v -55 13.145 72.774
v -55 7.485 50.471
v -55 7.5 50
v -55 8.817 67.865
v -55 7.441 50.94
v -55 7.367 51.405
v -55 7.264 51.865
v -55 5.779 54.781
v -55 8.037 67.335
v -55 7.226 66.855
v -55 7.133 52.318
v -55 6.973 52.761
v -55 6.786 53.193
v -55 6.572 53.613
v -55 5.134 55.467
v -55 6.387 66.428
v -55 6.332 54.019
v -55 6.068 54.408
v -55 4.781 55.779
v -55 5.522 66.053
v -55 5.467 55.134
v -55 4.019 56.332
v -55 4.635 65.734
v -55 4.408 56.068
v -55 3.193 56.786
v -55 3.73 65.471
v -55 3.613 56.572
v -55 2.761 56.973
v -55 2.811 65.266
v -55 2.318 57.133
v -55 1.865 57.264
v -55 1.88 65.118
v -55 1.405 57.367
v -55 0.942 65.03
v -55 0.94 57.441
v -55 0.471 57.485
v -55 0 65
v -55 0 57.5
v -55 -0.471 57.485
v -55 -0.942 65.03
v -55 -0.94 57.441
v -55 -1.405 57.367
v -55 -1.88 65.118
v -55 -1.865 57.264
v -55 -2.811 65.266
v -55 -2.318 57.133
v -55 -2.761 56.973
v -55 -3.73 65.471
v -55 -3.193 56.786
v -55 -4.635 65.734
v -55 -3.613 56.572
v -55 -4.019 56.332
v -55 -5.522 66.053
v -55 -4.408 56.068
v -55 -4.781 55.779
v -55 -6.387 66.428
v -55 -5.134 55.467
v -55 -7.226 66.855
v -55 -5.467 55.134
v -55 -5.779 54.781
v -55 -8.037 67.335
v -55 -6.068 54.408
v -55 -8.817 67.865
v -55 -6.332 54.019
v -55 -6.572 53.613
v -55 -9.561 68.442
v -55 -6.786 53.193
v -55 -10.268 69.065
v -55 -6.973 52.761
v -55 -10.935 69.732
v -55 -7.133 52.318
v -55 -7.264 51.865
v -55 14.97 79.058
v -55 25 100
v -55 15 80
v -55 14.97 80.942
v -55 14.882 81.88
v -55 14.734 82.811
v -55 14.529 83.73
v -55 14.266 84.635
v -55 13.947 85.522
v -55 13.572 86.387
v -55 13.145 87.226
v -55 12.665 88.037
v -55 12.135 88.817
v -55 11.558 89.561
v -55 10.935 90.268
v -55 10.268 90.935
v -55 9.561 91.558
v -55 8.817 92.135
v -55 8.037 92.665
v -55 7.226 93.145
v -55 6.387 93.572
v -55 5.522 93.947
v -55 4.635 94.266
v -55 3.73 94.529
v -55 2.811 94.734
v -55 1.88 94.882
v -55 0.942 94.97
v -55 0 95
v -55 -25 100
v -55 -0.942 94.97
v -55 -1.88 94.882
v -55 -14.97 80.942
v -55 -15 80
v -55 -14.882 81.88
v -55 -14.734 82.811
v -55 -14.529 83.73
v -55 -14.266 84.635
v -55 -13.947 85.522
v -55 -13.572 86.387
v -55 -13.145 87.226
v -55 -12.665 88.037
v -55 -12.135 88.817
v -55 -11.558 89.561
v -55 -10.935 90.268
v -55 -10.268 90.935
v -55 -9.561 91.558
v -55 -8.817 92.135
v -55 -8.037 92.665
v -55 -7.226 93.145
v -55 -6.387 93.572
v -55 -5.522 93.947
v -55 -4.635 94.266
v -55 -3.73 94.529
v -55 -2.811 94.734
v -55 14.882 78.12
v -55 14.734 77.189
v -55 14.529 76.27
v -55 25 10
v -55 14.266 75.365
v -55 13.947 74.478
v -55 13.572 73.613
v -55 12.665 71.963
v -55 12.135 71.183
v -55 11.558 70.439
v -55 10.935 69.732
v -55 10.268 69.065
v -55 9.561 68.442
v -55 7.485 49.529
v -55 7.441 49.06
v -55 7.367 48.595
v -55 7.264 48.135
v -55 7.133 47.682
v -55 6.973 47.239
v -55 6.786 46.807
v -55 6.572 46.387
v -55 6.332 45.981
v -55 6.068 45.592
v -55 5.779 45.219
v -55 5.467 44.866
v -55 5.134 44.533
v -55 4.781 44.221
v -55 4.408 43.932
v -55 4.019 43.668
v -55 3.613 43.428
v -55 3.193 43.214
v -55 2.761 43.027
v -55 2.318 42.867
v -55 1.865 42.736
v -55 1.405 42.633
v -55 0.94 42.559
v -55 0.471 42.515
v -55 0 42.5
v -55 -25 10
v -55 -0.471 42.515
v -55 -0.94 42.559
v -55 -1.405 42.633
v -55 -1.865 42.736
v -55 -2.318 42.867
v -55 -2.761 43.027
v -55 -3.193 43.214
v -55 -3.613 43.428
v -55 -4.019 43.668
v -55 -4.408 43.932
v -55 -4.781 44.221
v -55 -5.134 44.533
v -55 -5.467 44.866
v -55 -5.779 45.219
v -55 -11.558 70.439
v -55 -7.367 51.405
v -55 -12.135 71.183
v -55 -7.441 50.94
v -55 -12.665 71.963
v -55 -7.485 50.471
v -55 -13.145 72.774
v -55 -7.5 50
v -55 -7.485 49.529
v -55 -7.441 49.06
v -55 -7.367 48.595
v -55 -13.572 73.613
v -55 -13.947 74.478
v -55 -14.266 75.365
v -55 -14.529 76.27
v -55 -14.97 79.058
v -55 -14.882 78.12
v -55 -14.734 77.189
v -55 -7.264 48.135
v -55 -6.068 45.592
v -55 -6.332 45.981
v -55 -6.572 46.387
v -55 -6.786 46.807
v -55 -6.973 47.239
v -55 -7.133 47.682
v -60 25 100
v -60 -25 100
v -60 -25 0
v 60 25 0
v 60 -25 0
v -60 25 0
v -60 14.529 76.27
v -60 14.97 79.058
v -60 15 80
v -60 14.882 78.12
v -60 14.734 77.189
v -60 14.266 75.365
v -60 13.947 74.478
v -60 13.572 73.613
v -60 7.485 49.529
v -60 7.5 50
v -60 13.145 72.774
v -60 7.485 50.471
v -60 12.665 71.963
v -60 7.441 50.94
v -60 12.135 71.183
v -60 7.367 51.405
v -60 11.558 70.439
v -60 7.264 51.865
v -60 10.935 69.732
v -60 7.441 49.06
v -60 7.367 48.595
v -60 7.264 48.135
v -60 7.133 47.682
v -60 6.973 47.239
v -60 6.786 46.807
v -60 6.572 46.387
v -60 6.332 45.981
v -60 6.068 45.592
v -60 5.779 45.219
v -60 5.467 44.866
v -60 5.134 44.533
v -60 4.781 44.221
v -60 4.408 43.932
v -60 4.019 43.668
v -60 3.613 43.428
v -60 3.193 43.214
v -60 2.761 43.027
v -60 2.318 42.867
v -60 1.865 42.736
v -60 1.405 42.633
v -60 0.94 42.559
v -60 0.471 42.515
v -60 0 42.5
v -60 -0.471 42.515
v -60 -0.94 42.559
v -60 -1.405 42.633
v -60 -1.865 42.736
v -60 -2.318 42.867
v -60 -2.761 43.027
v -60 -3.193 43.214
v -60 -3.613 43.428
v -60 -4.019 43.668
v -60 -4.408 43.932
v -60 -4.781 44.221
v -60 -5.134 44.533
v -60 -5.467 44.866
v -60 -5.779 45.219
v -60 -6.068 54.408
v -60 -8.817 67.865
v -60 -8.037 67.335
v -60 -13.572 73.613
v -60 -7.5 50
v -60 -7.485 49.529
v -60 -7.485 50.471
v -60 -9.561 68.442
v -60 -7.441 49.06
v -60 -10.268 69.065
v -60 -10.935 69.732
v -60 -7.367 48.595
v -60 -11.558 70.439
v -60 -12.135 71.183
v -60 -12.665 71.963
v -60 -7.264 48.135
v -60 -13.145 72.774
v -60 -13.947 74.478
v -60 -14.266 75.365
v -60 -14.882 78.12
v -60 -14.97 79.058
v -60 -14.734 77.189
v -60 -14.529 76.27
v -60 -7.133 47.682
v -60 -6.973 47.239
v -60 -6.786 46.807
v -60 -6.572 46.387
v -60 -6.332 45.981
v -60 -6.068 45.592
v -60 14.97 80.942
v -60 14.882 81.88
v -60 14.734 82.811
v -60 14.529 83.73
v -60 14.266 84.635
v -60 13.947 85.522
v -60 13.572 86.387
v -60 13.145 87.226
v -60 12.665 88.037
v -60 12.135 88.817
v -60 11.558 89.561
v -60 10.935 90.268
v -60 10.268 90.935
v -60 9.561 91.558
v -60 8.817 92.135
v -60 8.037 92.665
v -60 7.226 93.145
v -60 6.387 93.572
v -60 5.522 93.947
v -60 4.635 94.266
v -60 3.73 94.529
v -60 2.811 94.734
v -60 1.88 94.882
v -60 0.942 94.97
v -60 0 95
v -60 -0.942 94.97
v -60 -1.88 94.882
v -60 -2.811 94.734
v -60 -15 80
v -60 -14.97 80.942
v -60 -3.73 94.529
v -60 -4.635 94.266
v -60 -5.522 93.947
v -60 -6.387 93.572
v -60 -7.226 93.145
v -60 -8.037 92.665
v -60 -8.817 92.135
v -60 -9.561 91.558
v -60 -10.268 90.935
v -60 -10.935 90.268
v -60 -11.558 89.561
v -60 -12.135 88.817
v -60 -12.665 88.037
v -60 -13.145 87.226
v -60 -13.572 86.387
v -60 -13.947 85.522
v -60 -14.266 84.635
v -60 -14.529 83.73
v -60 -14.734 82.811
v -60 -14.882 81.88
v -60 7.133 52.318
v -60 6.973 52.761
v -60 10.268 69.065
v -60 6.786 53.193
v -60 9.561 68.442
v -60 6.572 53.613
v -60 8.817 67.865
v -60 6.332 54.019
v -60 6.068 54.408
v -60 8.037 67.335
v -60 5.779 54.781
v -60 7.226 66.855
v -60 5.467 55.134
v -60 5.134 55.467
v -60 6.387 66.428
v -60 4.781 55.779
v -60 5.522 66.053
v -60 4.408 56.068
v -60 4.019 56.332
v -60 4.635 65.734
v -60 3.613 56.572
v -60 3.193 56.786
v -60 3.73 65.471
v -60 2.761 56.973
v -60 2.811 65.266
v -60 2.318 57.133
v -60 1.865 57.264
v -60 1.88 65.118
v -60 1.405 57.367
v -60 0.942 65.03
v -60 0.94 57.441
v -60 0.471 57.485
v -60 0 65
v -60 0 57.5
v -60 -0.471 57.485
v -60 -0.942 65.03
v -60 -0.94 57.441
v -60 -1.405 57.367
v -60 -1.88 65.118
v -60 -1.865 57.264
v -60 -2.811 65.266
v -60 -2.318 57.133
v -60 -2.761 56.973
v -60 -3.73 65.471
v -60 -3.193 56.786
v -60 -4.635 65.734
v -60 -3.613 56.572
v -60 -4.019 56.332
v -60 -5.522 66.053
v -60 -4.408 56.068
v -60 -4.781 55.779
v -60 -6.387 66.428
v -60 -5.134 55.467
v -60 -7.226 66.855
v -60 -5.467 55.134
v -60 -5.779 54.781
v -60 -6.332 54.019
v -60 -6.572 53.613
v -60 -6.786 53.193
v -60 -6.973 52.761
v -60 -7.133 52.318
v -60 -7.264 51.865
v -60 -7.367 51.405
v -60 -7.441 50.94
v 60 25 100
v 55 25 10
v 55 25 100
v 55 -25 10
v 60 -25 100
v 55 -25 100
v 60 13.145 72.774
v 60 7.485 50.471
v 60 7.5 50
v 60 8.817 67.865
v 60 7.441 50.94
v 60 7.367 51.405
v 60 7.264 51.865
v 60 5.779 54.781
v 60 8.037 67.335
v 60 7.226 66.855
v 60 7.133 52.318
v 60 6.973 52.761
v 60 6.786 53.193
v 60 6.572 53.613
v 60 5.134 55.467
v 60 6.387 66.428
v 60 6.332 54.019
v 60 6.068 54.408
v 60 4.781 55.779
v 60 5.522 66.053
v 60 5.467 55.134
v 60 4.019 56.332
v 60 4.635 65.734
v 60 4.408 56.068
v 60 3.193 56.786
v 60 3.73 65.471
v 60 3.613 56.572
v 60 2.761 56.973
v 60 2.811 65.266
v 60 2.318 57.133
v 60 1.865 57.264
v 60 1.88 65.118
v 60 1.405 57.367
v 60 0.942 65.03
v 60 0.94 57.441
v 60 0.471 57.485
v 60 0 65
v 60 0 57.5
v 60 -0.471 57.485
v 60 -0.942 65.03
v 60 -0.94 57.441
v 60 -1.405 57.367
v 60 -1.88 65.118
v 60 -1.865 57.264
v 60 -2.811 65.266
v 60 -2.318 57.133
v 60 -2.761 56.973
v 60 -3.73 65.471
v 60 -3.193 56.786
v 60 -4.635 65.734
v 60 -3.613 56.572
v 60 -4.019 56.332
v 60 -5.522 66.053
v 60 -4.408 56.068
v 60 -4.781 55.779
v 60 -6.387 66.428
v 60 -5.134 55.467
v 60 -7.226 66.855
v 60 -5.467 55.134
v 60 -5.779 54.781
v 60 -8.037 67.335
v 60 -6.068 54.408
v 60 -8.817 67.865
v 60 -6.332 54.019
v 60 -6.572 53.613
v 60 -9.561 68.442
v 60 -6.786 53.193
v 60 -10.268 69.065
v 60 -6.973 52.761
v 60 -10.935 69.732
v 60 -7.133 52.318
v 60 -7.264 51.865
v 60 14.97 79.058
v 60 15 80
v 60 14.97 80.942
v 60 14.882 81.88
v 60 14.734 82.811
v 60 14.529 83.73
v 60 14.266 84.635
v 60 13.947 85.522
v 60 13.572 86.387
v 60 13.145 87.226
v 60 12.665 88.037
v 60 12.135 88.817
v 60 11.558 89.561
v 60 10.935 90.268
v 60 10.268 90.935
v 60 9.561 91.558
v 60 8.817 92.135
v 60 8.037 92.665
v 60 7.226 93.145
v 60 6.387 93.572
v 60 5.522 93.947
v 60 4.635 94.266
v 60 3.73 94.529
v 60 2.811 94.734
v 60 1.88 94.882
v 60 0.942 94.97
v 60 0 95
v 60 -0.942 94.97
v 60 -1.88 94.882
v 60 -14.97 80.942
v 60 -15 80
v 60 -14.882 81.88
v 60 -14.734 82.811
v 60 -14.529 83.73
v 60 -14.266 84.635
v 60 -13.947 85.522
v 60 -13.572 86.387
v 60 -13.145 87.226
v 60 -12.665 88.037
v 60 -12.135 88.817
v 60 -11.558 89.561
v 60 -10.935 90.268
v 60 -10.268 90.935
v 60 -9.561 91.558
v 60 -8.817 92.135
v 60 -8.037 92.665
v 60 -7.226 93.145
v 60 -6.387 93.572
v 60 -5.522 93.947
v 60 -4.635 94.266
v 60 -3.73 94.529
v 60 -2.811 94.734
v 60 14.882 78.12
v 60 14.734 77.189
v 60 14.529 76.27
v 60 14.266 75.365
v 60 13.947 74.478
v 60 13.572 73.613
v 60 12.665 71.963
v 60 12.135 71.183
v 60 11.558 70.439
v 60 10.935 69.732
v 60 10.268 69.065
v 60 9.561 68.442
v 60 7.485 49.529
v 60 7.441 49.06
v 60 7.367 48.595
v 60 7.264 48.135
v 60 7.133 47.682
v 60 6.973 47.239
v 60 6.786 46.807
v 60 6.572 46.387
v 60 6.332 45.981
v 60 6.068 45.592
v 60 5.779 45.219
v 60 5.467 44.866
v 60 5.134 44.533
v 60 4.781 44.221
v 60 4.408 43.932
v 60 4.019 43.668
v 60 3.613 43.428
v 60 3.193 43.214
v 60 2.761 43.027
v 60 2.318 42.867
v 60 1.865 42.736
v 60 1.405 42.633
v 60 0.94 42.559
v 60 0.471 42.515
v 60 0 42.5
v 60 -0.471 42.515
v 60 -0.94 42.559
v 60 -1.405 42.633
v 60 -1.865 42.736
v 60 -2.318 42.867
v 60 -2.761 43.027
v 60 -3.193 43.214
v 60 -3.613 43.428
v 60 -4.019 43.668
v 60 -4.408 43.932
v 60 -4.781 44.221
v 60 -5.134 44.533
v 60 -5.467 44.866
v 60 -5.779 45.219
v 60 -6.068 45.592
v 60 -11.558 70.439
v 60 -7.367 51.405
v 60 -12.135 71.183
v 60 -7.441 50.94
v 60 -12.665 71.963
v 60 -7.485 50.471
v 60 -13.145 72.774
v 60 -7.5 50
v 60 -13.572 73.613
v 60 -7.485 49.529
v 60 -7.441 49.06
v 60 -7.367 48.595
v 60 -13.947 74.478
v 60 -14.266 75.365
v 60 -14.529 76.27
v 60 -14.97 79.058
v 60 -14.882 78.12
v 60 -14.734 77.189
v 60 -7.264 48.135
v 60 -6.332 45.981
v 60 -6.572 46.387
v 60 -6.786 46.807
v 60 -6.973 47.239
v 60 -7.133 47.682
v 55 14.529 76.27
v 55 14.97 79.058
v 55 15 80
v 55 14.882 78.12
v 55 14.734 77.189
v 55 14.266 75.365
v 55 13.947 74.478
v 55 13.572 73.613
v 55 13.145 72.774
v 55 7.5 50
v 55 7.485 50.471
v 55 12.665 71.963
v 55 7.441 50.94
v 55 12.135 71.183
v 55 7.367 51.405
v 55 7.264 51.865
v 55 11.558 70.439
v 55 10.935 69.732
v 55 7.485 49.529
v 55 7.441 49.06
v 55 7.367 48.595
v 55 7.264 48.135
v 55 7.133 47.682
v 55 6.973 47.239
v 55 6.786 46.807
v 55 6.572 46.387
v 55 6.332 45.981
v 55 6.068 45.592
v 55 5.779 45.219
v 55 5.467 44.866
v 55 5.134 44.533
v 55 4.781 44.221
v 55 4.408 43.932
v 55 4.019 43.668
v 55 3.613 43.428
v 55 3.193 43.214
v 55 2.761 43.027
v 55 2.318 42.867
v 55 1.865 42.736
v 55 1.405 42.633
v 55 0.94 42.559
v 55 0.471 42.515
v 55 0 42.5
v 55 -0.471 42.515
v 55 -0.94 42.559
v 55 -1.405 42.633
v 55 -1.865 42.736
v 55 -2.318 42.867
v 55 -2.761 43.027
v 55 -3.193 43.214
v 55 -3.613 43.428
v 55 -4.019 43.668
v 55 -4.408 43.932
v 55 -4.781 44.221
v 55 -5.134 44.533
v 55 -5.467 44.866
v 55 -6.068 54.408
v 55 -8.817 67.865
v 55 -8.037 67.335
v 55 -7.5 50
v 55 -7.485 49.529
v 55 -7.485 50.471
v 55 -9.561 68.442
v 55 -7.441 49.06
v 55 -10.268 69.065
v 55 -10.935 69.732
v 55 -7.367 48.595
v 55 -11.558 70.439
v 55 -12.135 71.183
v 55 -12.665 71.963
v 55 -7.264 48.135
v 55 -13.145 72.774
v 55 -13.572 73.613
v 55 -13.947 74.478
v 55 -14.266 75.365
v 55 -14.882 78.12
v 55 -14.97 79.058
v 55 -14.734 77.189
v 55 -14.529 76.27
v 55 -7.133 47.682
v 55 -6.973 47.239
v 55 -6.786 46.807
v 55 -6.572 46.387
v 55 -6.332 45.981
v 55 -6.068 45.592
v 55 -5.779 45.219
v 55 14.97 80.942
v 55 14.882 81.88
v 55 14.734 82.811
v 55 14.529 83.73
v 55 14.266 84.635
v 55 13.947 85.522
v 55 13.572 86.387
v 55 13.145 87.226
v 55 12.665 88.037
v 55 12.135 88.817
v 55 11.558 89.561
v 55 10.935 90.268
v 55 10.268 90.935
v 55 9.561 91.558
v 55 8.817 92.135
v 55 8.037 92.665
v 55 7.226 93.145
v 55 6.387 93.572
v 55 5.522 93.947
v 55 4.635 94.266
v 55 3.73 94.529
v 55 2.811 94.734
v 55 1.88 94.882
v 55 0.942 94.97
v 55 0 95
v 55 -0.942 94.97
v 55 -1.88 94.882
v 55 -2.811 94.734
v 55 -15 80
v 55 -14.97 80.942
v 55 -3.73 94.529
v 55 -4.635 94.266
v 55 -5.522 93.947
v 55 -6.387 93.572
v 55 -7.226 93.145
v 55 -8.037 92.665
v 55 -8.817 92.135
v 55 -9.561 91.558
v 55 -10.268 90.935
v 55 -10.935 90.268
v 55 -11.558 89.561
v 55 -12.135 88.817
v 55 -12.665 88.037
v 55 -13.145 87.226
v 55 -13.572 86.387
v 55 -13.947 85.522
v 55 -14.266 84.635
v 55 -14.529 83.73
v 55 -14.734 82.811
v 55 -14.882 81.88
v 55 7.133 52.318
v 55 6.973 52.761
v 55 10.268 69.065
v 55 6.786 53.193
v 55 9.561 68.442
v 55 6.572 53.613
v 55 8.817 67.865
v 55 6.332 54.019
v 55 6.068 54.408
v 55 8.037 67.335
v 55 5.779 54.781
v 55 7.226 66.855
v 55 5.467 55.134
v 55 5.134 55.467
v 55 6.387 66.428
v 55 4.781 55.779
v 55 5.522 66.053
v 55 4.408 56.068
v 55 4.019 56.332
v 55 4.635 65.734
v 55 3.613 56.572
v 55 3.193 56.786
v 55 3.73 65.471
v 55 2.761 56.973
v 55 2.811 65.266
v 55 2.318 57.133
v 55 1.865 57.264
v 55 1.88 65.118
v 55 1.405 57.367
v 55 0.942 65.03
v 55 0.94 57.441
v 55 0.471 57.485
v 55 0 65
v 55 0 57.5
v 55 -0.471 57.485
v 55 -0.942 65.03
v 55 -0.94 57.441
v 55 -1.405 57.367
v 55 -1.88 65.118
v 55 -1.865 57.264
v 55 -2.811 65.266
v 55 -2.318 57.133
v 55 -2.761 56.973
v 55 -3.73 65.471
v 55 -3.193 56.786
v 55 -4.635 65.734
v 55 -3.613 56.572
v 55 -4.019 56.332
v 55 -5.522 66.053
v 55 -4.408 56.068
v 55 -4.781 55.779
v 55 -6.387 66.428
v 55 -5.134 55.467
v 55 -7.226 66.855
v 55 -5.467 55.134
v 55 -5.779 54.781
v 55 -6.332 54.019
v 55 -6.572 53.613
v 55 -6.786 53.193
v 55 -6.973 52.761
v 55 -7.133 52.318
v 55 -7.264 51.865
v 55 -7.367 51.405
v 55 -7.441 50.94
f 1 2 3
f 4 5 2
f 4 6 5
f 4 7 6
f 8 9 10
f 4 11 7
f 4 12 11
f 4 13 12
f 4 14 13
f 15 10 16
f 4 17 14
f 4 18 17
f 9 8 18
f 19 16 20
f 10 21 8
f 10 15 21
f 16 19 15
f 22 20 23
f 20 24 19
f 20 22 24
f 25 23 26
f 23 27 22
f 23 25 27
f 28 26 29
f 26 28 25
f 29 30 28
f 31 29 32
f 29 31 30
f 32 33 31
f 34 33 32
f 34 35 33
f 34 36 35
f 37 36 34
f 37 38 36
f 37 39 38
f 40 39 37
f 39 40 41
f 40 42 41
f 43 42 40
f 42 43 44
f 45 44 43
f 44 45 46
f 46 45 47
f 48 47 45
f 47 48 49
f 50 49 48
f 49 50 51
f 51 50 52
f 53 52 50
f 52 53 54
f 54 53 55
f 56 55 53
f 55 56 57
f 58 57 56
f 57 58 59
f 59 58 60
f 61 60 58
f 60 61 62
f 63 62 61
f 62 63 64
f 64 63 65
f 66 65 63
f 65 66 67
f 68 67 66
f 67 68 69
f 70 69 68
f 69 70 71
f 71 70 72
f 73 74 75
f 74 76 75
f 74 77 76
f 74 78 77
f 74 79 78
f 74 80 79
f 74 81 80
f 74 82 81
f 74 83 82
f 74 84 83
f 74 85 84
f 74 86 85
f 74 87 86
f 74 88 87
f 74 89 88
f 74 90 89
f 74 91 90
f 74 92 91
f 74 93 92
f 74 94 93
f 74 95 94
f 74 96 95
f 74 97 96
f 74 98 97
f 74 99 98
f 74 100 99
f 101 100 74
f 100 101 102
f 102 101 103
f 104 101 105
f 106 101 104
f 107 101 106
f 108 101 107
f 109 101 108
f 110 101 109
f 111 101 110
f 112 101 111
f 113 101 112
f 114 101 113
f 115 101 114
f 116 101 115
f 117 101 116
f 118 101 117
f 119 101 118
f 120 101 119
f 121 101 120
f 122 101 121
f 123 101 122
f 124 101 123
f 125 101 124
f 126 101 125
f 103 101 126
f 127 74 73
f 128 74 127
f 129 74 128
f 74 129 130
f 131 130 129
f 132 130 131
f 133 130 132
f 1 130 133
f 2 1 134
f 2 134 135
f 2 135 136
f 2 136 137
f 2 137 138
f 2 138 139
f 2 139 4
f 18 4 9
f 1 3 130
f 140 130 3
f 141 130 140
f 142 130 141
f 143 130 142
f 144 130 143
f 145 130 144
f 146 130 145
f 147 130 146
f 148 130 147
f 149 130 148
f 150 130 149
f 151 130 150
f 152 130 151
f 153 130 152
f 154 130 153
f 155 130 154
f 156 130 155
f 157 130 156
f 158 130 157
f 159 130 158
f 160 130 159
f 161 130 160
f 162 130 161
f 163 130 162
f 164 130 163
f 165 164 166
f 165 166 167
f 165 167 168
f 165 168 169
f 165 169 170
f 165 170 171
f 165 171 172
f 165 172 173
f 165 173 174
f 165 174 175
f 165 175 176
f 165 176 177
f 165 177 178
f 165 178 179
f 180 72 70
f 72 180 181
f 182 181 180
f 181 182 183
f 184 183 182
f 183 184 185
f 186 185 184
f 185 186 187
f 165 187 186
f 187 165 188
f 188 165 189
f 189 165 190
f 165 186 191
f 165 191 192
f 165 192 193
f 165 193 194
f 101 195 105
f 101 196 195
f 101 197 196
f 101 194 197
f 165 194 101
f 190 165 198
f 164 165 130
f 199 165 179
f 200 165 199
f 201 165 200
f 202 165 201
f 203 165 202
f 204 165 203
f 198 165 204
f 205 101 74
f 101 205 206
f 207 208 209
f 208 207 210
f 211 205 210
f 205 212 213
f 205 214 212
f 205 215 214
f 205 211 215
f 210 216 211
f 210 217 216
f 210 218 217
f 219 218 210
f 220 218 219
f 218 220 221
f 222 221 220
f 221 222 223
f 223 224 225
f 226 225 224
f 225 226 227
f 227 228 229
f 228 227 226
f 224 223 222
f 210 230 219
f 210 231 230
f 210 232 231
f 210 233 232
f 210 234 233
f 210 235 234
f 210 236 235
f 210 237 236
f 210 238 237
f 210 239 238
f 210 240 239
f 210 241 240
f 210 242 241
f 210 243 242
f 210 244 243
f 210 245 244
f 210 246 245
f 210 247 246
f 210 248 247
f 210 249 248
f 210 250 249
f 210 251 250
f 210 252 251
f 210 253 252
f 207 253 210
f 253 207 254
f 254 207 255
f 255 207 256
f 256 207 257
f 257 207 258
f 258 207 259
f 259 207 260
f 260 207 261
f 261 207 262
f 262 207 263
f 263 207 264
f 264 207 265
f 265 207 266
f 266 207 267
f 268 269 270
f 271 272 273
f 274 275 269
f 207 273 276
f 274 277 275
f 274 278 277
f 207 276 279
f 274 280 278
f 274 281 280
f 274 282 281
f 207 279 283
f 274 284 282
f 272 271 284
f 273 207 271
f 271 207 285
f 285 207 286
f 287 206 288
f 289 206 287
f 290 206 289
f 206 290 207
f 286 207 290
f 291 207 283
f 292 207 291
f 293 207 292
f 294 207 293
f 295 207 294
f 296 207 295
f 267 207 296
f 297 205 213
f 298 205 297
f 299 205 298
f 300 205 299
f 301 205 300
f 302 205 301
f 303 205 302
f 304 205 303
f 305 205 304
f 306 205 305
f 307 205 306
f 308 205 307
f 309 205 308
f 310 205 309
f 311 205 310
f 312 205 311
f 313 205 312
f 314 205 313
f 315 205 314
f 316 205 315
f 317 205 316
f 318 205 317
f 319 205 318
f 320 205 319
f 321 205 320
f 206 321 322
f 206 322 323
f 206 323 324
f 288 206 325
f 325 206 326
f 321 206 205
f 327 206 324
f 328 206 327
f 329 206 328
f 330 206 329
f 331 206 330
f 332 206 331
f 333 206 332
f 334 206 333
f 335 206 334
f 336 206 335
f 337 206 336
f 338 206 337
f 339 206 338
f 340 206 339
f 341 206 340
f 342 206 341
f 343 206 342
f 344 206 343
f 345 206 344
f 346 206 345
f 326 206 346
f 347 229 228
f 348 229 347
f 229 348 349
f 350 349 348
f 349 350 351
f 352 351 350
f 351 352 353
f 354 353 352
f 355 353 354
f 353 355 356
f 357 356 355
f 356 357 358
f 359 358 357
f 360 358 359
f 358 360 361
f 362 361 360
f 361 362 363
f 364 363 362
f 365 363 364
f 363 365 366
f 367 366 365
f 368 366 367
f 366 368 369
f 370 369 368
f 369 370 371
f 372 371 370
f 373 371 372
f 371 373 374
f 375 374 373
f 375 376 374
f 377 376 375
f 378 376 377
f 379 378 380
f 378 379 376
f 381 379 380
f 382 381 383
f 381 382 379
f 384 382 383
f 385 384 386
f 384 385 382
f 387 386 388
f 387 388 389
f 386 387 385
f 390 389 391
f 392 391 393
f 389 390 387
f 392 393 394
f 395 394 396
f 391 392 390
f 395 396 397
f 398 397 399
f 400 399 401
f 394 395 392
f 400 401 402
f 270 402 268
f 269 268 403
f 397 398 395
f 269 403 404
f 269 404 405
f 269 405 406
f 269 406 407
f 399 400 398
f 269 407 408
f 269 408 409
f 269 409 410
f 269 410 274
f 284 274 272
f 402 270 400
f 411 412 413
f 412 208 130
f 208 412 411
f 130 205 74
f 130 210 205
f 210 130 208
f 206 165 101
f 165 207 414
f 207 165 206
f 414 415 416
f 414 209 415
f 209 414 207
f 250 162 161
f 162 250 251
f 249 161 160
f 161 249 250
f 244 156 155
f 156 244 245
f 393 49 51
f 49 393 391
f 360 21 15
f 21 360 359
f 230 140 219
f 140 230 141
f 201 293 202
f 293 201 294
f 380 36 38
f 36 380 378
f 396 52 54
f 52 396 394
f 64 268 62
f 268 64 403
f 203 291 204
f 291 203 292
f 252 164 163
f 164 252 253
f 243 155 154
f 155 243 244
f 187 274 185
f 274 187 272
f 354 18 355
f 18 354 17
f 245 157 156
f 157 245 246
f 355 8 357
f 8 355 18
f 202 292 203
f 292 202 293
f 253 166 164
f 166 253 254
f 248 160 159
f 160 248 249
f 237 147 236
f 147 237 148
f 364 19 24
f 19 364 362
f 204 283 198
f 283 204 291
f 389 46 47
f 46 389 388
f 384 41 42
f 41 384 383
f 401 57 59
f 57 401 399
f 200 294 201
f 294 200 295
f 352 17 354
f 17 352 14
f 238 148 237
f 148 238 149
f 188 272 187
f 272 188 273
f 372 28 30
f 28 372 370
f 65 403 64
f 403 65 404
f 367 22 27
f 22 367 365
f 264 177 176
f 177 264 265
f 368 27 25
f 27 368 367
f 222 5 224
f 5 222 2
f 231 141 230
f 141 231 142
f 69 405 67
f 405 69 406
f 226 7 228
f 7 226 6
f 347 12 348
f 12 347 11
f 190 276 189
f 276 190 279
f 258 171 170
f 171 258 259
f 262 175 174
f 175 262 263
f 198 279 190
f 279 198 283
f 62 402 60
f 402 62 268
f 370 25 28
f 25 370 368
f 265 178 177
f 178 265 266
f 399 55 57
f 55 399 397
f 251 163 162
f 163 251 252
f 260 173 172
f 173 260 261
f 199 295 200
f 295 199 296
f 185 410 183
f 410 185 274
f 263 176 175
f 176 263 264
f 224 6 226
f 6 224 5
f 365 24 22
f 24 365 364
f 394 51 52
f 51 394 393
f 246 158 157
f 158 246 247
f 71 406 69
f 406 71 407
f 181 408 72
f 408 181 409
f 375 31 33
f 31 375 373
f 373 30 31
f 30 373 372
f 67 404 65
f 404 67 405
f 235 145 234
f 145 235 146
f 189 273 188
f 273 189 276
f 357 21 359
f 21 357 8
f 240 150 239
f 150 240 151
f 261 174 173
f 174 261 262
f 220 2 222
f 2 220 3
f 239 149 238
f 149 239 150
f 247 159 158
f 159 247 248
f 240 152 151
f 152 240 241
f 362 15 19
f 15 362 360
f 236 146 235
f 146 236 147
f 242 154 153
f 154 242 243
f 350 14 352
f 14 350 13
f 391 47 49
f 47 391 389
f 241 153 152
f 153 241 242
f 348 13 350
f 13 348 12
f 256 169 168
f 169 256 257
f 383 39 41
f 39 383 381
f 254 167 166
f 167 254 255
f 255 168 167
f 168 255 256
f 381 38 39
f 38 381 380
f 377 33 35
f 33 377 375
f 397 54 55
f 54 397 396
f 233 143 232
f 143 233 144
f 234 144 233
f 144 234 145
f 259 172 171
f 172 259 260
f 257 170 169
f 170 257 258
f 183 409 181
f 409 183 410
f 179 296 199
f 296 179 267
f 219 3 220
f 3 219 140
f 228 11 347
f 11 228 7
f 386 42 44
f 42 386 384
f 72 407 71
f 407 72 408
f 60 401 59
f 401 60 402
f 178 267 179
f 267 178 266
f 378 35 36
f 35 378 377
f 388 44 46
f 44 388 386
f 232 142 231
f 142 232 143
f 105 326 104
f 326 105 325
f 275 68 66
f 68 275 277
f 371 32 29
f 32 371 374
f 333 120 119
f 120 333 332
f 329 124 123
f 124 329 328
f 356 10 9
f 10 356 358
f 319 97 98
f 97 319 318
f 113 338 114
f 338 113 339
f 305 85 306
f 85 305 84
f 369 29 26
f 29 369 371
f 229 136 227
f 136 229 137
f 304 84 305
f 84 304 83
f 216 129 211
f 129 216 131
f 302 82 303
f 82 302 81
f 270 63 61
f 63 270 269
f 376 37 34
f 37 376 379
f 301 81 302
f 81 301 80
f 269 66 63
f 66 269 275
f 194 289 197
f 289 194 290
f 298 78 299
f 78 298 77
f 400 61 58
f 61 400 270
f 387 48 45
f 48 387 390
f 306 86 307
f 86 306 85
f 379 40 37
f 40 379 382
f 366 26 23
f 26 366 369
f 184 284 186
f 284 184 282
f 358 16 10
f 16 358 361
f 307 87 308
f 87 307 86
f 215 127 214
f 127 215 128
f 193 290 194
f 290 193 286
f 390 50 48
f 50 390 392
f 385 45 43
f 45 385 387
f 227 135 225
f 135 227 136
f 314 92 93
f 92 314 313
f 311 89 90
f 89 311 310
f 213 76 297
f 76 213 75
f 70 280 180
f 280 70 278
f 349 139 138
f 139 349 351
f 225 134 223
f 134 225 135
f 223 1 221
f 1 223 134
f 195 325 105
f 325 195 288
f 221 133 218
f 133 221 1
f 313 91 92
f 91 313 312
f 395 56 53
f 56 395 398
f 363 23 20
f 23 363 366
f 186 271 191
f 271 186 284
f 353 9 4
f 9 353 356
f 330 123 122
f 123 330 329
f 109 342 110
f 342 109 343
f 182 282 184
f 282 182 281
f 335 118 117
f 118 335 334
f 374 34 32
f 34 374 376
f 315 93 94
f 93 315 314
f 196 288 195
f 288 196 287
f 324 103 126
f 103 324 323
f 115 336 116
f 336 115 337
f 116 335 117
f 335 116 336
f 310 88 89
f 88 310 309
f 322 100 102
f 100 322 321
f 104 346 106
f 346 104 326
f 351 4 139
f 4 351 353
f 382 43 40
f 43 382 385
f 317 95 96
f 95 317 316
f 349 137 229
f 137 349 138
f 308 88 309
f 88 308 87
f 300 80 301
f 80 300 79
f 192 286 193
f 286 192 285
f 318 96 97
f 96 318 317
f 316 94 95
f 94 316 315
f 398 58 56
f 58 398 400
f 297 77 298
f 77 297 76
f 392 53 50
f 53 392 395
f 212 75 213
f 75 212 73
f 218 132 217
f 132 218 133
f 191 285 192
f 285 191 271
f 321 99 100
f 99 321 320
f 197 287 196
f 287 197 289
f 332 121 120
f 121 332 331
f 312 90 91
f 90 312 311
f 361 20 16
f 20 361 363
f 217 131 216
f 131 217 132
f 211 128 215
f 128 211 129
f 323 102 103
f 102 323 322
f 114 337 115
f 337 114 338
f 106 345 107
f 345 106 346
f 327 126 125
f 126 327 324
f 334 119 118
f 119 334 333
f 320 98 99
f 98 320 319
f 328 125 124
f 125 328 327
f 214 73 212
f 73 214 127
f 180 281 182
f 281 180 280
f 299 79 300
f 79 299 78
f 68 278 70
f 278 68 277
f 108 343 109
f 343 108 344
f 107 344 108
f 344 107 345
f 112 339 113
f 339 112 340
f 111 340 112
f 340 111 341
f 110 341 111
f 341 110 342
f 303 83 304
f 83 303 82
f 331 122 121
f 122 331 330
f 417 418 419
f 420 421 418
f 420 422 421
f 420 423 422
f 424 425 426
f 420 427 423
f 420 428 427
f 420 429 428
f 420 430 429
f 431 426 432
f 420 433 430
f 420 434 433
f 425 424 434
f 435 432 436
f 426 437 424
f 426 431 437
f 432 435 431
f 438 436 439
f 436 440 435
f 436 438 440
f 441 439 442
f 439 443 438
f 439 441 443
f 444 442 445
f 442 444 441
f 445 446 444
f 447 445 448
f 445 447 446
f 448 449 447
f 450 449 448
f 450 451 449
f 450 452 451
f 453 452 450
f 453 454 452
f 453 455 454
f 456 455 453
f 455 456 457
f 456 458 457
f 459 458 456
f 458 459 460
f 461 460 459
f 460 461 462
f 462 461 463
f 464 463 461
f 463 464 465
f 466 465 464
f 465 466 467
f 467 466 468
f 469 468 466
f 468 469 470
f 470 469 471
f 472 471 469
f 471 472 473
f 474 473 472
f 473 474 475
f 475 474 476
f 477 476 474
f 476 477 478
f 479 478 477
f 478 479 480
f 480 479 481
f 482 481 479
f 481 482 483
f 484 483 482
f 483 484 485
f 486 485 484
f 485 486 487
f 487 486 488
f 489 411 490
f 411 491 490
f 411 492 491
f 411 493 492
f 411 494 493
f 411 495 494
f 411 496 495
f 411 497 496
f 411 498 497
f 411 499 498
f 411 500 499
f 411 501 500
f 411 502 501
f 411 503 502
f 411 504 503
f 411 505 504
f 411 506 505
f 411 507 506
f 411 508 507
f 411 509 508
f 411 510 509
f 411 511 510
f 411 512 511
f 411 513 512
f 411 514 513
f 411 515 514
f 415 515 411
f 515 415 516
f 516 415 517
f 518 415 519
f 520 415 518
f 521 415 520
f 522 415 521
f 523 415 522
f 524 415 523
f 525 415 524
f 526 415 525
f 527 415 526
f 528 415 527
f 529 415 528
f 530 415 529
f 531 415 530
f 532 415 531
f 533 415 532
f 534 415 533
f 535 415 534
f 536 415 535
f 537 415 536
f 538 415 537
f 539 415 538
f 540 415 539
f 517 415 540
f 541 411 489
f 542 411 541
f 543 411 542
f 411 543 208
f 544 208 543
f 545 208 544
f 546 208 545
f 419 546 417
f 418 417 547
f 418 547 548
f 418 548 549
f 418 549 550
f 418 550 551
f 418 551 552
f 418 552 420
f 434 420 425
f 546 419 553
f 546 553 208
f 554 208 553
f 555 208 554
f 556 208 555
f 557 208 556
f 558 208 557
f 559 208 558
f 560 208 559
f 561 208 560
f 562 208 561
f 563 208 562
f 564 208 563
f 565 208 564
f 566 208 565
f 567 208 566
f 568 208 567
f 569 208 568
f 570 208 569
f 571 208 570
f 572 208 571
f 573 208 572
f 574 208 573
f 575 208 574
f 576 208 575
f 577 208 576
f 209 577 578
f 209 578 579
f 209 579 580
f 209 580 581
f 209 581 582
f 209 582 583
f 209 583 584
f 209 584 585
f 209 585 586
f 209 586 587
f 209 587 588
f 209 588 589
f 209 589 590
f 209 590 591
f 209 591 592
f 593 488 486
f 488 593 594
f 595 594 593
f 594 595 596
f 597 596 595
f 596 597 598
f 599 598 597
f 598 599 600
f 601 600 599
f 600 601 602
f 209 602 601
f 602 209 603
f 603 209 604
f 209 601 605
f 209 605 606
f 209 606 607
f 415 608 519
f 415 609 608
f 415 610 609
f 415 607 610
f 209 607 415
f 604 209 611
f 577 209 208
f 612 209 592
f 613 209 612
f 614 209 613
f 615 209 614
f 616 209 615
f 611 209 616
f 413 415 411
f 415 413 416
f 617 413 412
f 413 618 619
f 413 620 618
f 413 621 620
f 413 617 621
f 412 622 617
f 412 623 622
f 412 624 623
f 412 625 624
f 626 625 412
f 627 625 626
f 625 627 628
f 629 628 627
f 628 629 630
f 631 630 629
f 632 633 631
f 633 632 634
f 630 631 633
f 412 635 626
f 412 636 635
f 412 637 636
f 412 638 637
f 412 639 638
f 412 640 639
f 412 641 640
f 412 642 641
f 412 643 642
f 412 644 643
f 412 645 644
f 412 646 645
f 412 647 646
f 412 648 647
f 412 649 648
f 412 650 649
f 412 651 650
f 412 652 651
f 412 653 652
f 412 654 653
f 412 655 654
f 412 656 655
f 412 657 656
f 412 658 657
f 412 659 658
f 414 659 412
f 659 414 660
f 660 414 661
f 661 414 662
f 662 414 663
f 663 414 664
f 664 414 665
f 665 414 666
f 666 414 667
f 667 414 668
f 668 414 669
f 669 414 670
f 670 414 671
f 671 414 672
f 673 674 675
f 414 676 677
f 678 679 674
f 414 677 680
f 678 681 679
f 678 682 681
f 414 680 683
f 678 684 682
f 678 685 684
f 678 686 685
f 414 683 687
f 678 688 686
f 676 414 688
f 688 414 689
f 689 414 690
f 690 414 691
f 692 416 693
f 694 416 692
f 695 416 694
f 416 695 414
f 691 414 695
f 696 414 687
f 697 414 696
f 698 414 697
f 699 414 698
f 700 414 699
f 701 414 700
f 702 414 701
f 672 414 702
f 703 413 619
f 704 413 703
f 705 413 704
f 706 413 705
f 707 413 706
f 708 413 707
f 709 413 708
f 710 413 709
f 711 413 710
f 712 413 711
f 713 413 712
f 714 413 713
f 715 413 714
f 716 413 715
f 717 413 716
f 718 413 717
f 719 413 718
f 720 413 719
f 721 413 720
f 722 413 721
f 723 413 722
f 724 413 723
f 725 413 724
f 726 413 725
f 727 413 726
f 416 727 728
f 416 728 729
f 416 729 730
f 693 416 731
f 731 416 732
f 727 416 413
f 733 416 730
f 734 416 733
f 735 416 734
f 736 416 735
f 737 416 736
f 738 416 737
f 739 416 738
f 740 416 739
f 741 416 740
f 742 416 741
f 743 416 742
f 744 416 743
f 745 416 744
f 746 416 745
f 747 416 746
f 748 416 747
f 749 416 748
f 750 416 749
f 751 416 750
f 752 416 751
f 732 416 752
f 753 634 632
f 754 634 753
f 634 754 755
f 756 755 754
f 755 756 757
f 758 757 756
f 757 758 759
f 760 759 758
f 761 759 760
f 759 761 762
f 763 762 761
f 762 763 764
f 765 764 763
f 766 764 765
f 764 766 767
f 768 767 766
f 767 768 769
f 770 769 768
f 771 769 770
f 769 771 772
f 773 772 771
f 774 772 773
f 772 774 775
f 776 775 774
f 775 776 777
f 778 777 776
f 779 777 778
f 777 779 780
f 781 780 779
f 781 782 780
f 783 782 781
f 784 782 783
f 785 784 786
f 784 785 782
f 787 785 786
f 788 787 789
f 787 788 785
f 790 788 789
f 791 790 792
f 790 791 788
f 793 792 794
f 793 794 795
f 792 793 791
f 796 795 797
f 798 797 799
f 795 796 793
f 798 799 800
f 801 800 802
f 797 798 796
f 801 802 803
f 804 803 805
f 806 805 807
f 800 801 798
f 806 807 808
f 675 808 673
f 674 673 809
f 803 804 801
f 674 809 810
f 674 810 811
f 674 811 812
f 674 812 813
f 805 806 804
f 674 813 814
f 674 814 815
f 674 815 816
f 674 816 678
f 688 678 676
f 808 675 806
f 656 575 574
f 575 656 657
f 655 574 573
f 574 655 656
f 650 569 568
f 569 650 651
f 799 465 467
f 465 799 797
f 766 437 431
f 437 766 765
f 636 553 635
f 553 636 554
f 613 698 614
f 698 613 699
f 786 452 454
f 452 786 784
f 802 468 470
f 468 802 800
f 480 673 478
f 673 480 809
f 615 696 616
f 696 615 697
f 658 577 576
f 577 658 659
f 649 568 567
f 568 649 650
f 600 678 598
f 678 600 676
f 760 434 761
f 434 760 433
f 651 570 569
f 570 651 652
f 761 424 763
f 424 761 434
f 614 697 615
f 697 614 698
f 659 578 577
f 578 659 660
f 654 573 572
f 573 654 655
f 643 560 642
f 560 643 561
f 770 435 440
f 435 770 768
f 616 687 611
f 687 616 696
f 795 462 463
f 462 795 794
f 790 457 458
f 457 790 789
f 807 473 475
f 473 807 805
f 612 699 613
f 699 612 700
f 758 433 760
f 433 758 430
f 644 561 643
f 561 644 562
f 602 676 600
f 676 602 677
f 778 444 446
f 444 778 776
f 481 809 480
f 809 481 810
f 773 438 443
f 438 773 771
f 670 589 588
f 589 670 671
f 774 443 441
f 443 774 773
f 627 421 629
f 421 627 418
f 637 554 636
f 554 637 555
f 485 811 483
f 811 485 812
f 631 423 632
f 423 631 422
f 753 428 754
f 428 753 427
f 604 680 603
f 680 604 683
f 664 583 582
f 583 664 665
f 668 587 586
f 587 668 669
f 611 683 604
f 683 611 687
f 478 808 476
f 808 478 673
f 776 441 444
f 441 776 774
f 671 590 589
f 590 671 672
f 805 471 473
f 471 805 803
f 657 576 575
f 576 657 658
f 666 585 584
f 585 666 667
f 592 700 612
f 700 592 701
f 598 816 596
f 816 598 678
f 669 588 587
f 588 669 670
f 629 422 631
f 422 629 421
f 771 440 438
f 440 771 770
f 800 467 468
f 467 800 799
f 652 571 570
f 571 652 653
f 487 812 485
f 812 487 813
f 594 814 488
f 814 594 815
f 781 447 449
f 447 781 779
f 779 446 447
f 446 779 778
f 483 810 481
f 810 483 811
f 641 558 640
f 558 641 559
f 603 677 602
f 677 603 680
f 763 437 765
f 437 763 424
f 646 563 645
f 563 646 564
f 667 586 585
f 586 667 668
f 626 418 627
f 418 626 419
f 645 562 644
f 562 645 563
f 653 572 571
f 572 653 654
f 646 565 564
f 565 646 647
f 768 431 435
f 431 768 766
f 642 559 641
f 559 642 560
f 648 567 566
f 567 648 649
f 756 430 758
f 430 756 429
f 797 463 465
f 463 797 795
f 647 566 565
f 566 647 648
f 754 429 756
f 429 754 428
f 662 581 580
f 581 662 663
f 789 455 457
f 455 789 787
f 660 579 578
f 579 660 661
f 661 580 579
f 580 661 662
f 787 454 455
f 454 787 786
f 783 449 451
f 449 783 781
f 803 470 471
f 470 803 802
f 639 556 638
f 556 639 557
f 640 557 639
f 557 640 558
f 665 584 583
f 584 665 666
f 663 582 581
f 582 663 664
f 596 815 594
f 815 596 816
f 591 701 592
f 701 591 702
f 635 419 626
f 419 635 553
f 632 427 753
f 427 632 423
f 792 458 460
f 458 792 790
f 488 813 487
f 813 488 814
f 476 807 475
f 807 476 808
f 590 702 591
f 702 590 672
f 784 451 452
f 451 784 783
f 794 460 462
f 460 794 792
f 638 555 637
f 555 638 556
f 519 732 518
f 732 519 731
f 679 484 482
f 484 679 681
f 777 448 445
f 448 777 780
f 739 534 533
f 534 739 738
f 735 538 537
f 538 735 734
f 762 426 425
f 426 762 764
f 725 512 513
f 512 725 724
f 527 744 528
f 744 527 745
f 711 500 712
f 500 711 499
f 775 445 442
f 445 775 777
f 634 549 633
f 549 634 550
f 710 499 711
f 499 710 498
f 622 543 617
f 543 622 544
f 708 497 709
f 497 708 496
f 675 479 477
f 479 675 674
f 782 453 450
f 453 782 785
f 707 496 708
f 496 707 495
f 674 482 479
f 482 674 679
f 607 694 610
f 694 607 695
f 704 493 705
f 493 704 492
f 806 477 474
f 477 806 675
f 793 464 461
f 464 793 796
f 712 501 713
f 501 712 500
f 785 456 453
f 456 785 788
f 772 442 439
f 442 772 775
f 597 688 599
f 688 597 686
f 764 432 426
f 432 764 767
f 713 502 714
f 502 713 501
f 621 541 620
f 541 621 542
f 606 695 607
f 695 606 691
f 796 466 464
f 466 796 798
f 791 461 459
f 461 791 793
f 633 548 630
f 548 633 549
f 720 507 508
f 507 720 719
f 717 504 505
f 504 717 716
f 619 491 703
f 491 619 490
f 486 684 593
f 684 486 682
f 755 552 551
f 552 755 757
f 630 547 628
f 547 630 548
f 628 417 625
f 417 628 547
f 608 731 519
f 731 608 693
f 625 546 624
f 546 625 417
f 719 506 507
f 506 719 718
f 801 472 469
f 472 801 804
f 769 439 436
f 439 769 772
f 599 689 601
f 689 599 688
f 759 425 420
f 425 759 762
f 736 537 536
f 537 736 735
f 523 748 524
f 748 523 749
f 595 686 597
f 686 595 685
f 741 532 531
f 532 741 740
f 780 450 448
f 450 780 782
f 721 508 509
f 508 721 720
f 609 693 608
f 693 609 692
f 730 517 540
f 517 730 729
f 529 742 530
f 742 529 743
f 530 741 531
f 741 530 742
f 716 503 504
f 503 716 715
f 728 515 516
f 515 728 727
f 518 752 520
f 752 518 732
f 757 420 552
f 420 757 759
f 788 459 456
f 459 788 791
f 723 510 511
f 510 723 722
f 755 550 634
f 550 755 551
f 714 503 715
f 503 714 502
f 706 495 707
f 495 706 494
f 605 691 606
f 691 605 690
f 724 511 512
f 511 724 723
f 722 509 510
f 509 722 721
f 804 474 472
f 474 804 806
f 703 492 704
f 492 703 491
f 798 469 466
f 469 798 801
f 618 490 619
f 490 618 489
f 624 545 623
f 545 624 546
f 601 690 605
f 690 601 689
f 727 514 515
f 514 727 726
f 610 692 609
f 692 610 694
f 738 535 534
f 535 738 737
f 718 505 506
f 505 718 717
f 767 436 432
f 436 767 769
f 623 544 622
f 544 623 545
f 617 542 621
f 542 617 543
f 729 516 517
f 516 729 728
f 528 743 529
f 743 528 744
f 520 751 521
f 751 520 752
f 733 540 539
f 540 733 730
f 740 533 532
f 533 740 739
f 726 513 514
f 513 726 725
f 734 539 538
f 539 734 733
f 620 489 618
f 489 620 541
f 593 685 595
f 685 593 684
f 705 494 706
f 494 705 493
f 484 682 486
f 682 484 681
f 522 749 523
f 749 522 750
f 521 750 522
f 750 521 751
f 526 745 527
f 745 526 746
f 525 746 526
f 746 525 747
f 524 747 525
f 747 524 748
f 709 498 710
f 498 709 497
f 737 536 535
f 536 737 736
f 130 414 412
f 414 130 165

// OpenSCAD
union(){
    translate([-57.5,0,50])
    difference() {
        difference() {
            cube([5,50,100],true);
            
            rotate([0,90,0])
            cylinder(h=30, r=7.5, $fn=100, center=true);
        }
        translate([0, 0, 30])
        rotate([0,90,0])
        cylinder(h=30, r=15, $fn=100, center=true);
    }
    
    translate([57.5,0,50])
    difference() {
        difference() {
            cube([5,50,100],true);
            
            rotate([0,90,0])
            cylinder(h=30, r=7.5, $fn=100, center=true);
        }
        translate([0, 0, 30])
        rotate([0,90,0])
        cylinder(h=30, r=15, $fn=100, center=true);
    }
    
    translate([0,0,5])
    cube([120,50,10],true);
}
